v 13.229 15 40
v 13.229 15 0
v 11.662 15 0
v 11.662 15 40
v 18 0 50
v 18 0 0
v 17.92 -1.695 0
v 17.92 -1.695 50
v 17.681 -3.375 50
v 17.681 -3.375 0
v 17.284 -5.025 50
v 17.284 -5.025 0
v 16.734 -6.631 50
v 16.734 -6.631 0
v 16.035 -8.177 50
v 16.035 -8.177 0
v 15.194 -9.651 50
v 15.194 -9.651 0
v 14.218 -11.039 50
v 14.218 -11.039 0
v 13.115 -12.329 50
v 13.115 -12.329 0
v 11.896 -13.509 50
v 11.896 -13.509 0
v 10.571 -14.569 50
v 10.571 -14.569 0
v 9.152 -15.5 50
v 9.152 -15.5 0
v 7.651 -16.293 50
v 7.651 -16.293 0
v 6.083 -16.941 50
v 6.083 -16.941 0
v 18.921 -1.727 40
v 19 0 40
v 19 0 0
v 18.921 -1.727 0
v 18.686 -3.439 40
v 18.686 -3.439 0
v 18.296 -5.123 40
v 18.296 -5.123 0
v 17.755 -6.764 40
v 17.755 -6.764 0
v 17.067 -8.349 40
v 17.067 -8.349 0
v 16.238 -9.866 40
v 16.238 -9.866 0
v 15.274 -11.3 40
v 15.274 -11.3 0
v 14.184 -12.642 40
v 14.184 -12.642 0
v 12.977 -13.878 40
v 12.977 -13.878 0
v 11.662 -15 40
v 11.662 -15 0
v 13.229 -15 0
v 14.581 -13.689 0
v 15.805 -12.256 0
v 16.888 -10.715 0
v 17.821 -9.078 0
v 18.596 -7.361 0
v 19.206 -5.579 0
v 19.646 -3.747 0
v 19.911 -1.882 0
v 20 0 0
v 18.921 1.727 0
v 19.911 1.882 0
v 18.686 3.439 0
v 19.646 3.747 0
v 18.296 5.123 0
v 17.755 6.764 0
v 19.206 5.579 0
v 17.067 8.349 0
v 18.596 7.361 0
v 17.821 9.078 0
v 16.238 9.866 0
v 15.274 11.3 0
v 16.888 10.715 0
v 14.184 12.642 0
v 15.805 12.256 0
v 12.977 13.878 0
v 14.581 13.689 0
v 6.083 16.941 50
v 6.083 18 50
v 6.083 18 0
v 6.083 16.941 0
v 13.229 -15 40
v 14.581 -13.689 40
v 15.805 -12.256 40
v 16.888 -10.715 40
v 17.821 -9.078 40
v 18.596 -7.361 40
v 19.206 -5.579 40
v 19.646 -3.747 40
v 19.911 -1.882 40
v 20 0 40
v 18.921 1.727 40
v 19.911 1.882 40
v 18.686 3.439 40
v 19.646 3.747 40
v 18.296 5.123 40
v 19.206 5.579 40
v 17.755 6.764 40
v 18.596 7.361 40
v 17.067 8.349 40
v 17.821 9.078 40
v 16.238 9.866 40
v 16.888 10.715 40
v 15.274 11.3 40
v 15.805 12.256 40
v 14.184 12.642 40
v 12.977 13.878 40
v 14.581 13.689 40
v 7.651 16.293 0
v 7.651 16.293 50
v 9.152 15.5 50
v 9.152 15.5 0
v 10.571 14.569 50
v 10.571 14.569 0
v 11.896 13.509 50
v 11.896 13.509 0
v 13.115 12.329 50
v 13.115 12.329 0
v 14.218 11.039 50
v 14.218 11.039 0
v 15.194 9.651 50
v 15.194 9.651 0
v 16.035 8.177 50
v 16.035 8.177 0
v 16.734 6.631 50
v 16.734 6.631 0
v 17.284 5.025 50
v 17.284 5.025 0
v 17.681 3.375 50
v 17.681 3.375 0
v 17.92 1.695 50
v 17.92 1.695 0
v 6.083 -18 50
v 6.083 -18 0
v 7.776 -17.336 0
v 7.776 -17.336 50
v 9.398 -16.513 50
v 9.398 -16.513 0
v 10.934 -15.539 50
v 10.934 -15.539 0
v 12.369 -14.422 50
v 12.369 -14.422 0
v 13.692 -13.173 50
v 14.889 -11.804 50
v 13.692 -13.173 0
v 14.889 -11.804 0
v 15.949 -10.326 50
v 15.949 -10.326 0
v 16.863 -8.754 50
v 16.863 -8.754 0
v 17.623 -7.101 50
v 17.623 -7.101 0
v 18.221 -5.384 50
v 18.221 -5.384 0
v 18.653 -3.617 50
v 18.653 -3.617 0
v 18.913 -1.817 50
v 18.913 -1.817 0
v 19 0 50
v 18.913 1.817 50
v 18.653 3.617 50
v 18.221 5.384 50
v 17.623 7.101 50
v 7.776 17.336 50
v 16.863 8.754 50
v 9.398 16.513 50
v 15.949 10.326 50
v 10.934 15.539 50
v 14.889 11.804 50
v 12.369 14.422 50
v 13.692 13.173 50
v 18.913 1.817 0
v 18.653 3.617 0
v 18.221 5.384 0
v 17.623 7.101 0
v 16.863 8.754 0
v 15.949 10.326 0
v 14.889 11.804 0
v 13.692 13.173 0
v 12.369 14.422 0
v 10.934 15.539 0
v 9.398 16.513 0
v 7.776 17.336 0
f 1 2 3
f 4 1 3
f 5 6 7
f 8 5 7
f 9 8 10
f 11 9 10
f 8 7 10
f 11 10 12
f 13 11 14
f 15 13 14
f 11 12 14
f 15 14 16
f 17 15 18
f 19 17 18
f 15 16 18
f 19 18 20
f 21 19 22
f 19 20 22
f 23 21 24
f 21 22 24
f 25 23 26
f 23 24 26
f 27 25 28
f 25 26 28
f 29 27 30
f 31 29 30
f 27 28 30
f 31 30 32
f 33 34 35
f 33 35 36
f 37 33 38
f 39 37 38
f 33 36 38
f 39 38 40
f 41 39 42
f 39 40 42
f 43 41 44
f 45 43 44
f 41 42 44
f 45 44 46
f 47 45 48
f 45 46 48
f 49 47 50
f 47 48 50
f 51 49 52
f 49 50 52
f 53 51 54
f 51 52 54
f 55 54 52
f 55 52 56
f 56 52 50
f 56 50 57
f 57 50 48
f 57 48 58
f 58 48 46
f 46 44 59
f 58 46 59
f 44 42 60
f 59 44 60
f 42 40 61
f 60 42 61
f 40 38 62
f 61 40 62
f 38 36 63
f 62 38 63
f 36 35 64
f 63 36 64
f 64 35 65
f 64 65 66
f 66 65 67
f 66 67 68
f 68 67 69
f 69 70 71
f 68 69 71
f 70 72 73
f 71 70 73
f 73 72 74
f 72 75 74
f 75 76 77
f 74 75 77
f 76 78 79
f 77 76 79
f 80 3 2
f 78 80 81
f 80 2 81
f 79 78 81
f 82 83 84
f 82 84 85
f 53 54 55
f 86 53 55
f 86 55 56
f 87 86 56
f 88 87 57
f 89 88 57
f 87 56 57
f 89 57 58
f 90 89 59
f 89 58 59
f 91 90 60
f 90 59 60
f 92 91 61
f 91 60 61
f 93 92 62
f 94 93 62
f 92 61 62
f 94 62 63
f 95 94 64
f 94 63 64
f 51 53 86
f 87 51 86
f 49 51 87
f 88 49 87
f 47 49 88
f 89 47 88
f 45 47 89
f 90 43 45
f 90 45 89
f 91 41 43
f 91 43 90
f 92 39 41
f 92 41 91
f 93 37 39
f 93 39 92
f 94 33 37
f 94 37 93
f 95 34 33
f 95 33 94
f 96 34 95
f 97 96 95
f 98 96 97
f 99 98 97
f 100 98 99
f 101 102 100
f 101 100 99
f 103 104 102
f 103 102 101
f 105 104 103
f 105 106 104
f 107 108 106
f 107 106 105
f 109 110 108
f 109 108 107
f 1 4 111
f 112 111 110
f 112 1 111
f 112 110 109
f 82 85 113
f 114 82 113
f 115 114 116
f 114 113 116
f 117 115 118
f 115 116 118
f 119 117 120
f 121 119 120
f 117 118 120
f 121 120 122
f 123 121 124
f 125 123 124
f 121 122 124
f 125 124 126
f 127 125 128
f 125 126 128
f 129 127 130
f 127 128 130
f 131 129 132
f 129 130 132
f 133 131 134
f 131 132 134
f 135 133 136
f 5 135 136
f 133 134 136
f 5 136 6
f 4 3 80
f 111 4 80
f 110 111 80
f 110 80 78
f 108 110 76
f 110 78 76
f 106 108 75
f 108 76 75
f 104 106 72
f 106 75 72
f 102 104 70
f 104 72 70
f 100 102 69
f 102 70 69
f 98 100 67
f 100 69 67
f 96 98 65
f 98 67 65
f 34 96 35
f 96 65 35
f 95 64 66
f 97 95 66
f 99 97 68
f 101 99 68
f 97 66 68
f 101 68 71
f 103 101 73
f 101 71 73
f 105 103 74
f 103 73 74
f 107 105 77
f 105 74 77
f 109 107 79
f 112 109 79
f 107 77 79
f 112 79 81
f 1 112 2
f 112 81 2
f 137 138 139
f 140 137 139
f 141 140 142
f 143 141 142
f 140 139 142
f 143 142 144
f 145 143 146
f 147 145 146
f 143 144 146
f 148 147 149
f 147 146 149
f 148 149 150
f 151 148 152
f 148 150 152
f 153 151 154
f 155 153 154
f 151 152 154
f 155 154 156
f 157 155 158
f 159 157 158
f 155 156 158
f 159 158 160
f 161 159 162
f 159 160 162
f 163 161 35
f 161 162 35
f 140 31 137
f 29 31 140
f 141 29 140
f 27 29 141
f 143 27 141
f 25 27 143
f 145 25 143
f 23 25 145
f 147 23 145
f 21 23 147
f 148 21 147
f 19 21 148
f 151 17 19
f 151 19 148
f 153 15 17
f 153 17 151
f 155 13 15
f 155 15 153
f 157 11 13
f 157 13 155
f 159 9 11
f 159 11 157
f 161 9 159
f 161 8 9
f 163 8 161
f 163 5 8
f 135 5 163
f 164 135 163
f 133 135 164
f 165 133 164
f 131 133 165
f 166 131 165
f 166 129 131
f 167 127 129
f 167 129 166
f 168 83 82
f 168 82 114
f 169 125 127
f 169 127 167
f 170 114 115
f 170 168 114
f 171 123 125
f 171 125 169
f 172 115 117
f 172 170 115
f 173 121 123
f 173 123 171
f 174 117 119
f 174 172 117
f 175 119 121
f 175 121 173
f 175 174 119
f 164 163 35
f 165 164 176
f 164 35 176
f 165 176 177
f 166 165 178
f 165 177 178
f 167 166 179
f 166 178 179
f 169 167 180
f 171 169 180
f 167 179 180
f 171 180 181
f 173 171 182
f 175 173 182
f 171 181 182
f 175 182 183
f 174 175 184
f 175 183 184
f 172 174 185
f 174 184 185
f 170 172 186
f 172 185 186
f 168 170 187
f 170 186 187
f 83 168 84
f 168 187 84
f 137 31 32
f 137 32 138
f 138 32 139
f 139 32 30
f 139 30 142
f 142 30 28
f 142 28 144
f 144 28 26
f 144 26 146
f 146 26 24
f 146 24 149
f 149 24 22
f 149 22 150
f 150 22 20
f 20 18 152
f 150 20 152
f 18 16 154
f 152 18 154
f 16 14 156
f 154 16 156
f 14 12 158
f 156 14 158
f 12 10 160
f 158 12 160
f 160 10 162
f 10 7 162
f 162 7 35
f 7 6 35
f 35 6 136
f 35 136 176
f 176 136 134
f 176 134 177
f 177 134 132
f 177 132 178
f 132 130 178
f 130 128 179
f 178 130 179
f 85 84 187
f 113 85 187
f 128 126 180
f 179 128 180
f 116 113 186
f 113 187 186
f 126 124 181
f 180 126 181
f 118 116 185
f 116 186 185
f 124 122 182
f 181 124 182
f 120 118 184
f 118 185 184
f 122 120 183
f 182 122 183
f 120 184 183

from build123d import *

# Parameters (mm, degrees)
F2_DEPTH = 40
F3_DEPTH = 50


with BuildPart() as f2:
    # F1 (on Top) → F2 (new body)
    with BuildSketch(Plane.XY):
        with BuildLine():
            ThreePointArc((11.661904, 15), (17.067164, 8.349366), (19, 0))
            ThreePointArc((19, 0), (17.067164, -8.349366), (11.661904, -15))
            Line((11.661904, -15), (13.228757, -15))
            ThreePointArc((13.228757, -15), (18.228757, -8.228757), (20, 0))
            ThreePointArc((20, 0), (18.228757, 8.228757), (13.228757, 15))
            Line((13.228757, 15), (11.661904, 15))
        make_face()
    extrude(amount=F2_DEPTH)


with BuildPart() as f3:
    # F0 (on Top) → F3 (new body)
    with BuildSketch(Plane.XY):
        with BuildLine():
            ThreePointArc((19, 0), (15.436523, 11.077624), (6.082763, 18))
            Line((6.082763, 18), (6.082763, 16.941074))
            ThreePointArc((6.082763, 16.941074), (14.722257, 10.356406), (18, 0))
            ThreePointArc((18, 0), (14.722257, -10.356406), (6.082763, -16.941074))
            Line((6.082763, -16.941074), (6.082763, -18))
            ThreePointArc((6.082763, -18), (15.436523, -11.077624), (19, 0))
        make_face()
    extrude(amount=F3_DEPTH)


solid = Compound([f2.part, f3.part])
